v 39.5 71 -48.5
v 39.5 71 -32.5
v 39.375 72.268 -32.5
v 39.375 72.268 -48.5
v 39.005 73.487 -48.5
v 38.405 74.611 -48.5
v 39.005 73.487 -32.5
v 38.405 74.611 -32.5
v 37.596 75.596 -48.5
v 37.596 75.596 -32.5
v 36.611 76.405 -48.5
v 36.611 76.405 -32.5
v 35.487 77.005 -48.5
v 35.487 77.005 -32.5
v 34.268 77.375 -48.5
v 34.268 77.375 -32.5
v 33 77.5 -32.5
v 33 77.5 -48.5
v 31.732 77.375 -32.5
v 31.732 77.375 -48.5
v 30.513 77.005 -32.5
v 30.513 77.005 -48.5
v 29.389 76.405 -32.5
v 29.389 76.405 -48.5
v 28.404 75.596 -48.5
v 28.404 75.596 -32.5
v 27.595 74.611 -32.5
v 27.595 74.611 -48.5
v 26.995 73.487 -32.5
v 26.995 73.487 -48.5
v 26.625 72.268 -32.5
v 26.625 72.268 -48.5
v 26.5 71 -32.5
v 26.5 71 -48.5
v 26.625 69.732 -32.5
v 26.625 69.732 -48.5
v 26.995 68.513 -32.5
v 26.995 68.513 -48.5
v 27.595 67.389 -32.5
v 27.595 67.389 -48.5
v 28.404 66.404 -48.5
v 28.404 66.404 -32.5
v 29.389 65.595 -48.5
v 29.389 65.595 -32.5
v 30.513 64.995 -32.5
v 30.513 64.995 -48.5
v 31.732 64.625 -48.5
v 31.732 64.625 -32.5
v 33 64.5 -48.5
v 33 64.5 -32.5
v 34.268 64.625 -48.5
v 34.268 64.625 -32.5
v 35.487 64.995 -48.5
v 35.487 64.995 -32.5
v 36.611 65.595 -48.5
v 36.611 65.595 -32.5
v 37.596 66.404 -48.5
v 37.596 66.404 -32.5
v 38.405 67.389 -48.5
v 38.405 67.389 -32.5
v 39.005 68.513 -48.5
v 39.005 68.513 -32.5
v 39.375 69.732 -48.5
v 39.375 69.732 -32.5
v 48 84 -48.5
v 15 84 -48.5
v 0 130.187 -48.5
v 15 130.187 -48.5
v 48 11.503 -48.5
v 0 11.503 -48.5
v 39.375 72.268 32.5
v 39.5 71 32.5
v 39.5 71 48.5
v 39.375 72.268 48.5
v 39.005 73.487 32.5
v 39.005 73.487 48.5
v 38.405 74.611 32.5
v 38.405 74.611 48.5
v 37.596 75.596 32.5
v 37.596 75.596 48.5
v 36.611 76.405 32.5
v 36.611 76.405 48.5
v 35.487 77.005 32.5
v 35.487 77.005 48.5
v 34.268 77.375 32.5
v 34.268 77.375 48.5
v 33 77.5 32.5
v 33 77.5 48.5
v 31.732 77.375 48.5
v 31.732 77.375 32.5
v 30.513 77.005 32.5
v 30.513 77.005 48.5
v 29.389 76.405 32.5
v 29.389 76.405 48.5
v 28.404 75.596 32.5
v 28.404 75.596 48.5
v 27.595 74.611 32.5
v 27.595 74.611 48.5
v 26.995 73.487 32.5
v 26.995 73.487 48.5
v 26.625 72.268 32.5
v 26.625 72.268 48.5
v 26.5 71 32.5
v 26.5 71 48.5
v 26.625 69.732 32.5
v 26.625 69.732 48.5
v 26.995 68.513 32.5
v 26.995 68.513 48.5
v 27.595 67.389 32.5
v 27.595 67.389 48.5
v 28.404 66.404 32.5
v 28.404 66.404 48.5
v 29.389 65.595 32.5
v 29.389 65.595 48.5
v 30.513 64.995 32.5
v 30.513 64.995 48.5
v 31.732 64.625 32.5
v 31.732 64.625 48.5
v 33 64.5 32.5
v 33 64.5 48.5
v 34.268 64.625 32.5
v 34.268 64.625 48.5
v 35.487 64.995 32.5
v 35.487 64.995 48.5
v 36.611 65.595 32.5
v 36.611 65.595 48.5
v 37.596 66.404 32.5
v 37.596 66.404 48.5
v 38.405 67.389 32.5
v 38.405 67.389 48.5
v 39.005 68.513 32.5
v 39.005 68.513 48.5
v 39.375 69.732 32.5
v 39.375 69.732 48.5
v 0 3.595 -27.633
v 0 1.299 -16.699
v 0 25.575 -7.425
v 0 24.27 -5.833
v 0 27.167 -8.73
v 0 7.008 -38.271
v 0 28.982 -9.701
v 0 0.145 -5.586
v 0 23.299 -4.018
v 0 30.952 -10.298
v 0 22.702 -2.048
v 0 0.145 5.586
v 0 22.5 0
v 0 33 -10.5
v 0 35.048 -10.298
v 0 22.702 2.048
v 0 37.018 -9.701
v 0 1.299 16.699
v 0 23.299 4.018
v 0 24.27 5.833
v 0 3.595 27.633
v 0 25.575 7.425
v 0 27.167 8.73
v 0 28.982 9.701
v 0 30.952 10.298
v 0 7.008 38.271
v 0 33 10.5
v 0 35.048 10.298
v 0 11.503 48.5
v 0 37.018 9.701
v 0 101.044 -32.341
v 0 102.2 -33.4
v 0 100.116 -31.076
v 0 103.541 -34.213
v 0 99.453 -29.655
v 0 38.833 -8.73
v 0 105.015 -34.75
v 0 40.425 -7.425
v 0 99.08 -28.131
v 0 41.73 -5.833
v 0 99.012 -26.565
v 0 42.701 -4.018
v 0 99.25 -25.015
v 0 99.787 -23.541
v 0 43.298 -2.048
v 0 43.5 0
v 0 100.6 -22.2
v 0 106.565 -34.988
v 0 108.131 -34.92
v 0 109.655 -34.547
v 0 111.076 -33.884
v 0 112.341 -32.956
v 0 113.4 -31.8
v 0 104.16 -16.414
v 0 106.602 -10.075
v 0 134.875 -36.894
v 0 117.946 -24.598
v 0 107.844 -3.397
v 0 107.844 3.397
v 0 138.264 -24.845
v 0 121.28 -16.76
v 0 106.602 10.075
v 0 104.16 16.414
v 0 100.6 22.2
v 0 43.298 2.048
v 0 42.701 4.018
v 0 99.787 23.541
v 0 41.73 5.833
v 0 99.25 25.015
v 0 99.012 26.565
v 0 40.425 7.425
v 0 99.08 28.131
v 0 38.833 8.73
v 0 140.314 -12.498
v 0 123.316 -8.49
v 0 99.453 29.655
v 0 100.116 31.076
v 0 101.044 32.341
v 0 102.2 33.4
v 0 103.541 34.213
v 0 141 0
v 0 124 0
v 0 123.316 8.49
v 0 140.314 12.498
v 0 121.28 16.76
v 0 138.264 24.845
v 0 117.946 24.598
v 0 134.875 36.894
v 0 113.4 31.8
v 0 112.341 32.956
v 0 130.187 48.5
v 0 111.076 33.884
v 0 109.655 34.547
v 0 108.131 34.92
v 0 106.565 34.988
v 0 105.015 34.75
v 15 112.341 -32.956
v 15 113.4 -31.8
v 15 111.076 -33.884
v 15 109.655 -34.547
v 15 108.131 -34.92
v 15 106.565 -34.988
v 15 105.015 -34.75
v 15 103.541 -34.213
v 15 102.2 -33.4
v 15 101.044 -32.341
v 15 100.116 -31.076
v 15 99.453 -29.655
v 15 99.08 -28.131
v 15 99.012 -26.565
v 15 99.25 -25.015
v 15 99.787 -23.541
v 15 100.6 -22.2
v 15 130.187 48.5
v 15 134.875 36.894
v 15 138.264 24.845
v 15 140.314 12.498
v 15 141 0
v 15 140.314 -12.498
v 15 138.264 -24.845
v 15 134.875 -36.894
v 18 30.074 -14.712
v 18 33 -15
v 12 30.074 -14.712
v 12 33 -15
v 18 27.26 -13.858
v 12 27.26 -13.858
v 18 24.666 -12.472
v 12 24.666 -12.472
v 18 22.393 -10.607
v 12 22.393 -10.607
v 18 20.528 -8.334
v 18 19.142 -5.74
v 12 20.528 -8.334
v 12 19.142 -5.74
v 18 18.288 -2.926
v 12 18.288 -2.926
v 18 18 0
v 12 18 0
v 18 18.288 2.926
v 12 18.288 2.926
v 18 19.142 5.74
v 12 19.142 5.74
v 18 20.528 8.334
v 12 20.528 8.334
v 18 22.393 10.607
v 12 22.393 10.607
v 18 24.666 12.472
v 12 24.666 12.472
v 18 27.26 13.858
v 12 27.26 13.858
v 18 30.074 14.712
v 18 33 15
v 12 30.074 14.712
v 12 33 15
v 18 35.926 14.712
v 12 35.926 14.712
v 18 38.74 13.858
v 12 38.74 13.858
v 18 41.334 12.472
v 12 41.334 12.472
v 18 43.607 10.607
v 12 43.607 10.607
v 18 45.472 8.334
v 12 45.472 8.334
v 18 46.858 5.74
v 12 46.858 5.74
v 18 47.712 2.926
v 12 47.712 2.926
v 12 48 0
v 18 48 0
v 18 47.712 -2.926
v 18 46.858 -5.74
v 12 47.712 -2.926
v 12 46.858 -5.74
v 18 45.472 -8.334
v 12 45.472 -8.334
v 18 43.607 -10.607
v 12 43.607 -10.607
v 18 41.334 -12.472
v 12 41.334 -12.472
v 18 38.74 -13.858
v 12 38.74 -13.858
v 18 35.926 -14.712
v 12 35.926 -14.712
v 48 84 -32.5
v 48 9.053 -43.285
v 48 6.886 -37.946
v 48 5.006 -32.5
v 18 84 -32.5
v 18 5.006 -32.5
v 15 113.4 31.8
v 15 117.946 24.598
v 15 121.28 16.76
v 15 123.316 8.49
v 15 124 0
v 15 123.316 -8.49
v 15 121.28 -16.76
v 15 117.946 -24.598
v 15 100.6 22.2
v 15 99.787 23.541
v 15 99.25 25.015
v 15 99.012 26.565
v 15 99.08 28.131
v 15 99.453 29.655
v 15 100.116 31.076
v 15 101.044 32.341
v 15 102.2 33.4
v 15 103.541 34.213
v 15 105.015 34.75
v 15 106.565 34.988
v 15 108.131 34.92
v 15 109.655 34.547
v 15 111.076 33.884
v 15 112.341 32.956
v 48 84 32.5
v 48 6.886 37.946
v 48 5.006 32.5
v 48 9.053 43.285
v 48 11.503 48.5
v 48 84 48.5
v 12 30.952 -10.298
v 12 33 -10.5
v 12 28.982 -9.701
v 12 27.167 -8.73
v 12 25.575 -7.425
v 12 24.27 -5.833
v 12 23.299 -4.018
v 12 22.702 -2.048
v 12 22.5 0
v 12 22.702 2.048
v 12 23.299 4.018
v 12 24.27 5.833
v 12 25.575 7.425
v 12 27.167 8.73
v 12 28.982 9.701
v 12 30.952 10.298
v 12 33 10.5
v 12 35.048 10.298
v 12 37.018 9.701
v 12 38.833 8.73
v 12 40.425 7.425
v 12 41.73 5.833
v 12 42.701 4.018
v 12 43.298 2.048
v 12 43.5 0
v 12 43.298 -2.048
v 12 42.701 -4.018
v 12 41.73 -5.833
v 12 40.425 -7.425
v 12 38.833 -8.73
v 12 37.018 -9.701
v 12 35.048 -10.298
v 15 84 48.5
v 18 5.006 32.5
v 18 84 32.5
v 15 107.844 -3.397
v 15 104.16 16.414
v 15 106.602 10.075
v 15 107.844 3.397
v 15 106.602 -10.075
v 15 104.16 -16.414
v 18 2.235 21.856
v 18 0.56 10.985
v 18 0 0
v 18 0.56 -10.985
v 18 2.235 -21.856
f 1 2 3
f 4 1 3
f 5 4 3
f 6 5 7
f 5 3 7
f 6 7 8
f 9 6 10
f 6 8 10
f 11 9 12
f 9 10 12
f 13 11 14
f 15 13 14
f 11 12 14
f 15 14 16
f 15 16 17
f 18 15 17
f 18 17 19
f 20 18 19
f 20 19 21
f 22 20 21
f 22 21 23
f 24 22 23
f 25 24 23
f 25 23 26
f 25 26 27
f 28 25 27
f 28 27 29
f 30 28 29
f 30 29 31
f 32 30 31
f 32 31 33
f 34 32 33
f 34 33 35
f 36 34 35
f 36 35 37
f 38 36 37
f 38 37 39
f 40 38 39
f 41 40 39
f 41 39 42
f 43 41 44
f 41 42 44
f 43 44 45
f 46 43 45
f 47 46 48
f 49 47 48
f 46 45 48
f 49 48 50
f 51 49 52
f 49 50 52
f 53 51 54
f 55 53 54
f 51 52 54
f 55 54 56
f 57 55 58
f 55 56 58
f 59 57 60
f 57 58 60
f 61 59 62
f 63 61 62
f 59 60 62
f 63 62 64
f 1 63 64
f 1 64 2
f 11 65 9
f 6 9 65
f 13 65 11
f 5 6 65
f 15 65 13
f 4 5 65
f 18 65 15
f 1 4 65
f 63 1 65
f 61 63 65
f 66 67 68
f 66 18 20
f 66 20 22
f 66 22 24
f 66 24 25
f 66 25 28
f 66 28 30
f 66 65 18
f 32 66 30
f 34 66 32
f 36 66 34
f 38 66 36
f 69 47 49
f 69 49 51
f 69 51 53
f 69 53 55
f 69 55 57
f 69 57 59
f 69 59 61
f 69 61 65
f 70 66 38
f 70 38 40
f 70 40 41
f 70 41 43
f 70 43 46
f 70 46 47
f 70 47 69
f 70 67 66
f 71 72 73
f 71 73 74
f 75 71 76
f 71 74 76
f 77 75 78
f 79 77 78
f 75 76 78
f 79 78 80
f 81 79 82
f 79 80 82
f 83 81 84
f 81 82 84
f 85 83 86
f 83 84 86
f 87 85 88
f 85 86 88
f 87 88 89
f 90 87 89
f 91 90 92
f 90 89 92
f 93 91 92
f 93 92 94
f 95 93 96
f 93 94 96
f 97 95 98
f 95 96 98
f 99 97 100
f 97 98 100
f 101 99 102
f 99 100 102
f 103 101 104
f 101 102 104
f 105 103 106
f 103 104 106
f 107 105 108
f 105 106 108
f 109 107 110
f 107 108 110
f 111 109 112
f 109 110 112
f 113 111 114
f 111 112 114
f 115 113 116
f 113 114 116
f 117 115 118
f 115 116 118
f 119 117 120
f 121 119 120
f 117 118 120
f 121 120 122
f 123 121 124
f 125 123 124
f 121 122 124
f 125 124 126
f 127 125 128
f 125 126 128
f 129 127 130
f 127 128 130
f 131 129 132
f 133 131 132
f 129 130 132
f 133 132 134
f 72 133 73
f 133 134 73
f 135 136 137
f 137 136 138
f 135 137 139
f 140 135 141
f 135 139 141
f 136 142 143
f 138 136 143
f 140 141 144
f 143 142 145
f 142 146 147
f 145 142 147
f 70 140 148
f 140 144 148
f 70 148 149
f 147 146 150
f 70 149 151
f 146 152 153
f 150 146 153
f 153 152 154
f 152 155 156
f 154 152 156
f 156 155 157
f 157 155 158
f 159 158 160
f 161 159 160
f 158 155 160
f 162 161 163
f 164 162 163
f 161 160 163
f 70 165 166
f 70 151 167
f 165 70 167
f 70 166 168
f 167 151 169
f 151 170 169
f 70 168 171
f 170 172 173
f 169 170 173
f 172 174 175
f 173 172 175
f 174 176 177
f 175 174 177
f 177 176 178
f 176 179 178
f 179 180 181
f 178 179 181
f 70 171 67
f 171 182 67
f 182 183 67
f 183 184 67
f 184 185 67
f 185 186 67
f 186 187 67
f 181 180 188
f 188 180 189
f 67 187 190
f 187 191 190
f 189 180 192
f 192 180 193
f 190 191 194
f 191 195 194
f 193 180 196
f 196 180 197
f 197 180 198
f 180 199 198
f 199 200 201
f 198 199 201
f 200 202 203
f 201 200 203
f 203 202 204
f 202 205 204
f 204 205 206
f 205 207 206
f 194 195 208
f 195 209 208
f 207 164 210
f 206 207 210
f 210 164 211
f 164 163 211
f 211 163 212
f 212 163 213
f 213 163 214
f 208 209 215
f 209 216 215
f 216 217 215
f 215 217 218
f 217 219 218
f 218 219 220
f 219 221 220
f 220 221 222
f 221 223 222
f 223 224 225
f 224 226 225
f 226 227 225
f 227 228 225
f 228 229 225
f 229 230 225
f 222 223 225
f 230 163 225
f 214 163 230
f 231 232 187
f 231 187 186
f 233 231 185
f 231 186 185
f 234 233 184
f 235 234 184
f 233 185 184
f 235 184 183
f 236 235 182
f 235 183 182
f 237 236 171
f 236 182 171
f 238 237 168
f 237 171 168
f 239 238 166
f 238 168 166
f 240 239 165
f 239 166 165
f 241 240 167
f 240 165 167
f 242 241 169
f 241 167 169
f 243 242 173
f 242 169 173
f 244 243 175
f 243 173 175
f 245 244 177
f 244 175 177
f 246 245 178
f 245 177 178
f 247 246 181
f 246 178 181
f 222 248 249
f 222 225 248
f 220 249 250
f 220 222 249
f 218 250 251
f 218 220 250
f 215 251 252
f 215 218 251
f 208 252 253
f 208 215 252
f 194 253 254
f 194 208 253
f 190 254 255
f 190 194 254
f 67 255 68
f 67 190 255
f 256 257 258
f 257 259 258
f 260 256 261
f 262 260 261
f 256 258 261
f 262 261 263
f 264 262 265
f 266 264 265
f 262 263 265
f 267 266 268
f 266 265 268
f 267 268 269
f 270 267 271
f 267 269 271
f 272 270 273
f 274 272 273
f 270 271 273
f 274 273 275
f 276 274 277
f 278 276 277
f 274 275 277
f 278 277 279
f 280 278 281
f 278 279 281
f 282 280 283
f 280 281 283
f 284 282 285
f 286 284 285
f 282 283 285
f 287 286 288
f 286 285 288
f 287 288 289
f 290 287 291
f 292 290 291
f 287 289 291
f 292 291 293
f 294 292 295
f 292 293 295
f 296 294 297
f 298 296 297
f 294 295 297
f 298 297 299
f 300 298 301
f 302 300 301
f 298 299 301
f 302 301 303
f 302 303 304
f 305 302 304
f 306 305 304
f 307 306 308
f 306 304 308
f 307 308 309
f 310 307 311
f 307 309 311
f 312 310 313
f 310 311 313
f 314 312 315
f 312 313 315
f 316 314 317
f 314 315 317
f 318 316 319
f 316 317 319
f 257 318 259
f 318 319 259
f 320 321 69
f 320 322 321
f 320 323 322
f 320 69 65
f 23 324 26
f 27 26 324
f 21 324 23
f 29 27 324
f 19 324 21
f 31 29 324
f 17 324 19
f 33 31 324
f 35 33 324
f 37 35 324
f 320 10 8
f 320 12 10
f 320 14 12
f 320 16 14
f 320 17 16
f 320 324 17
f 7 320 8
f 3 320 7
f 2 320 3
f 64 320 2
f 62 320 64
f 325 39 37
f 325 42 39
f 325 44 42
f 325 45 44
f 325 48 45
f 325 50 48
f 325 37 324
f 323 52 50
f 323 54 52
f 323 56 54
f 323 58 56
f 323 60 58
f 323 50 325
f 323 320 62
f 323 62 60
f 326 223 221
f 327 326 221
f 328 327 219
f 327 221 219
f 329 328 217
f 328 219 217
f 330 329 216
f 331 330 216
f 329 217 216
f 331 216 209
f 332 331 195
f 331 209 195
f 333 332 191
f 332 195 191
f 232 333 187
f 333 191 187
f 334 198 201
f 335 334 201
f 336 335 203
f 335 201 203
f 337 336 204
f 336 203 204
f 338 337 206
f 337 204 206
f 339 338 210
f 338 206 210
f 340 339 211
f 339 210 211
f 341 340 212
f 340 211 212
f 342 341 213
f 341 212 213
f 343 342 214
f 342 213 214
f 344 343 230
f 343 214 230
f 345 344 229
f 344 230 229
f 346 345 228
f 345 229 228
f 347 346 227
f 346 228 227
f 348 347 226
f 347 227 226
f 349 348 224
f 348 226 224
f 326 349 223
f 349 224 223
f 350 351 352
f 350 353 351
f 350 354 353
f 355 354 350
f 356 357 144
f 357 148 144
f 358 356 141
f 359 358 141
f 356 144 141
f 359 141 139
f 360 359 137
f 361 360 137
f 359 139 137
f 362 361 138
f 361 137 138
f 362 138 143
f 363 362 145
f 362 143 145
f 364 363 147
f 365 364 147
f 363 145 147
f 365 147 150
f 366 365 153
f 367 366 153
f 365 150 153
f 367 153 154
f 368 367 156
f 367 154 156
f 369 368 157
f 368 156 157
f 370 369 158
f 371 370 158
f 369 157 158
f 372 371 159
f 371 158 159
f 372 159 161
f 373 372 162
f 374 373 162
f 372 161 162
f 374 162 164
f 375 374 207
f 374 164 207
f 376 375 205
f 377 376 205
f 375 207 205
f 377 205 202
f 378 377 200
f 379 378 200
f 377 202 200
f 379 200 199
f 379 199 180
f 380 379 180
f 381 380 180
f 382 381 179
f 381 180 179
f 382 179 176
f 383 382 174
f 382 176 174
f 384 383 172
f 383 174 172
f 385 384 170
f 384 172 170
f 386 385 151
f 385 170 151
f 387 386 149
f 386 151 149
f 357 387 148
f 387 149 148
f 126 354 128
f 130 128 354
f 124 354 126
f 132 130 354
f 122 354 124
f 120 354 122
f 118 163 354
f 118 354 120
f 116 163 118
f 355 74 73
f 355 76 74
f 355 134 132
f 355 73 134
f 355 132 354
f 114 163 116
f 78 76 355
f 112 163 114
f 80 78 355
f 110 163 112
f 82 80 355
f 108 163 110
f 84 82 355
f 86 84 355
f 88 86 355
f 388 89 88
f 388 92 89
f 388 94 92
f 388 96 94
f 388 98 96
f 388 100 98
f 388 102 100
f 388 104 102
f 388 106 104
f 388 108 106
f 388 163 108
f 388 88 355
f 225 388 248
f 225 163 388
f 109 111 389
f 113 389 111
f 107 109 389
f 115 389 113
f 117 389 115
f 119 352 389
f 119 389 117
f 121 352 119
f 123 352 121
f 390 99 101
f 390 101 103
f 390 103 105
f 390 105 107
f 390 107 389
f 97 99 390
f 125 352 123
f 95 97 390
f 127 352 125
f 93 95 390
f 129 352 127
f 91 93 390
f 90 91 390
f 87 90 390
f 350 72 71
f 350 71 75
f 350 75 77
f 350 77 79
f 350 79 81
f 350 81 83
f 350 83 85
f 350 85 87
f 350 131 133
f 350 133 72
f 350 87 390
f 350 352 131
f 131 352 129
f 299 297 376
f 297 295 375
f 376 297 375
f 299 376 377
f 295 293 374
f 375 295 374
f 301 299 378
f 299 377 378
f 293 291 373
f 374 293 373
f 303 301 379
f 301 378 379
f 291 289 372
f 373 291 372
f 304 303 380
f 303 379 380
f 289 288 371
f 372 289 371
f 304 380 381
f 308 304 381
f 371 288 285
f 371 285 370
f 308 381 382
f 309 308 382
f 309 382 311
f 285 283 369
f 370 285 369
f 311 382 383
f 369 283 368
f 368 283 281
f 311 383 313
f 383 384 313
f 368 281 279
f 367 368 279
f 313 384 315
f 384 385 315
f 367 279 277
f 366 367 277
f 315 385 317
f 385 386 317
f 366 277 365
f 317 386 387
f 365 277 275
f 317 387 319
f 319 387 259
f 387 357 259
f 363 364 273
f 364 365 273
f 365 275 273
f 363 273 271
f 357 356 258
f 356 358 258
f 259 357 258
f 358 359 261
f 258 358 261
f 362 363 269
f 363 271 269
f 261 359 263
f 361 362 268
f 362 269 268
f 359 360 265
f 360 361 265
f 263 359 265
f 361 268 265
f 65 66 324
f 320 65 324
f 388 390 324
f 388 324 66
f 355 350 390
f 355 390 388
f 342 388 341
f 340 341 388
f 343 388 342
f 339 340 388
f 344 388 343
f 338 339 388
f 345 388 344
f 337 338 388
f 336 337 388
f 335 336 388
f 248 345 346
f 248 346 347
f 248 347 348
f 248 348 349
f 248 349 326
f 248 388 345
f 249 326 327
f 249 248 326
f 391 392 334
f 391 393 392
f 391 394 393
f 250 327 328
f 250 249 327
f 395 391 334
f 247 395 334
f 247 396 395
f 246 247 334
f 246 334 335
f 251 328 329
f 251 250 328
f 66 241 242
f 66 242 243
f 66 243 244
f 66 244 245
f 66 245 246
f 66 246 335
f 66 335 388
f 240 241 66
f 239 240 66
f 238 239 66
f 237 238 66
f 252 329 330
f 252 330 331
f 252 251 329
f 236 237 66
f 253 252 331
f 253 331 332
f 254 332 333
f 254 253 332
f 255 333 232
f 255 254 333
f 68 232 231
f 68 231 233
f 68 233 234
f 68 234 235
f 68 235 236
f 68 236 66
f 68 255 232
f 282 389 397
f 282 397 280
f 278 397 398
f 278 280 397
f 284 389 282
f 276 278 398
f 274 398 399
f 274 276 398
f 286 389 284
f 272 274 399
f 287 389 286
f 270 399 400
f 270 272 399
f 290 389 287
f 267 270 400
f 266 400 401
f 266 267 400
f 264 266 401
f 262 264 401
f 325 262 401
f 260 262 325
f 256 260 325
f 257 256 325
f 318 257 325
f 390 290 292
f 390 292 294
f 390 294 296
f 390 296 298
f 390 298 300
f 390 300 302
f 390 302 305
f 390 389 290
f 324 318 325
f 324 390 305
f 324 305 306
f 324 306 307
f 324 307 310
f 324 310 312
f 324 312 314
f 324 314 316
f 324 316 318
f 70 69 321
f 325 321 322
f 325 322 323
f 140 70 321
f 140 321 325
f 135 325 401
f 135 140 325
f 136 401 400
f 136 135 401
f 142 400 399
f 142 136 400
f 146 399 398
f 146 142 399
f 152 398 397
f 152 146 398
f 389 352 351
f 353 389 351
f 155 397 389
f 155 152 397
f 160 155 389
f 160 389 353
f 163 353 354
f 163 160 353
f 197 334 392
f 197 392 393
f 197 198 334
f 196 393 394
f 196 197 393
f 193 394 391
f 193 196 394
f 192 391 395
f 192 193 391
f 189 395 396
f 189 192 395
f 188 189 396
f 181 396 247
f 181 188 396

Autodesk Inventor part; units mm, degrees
ref_plane "YZ Plane" through (0, 0, 0) normal (1, 0, 0) x (0, 1, 0)
ref_plane "XZ Plane" through (0, 0, 0) normal (0, 1, 0) x (-1, 0, 0)
ref_plane "XY Plane" through (0, 0, 0) normal (0, 0, 1) x (1, 0, 0)
sketch "Sketch1" plane through (0, 0, 0) normal (1, 0, 0) x (0, 1, 0)
  arc A0 (11.5026, 48.5) -> (11.5026, -48.5) centre (108, 0) ccw
  arc A1 (130.1868, -48.5) -> (130.1868, 48.5) centre (26.826, 0) ccw
  line L0 (11.5026, 48.5) -> (130.1868, 48.5)
  line L1 (130.1868, -48.5) -> (11.5026, -48.5)
  line L2 (0, 0) -> (141, 0)
  arc A2 (107, -27) -> (107, 27) centre (71, 0) ccw construction
  arc A3 (113.4, -31.8) -> (113.4, 31.8) centre (71, 0) ccw
  arc A4 (100.6, -22.2) -> (100.6, 22.2) centre (71, 0) ccw
  arc A5 (100.6, -22.2) -> (113.4, -31.8) centre (107, -27) ccw
  arc A6 (113.4, 31.8) -> (100.6, 22.2) centre (107, 27) ccw
  dimension "d0" = 108
  dimension "d2" = 141
  dimension "d3" = 97
  dimension "d4" = 54
  dimension "d5" = 8
  dimension "d6" = 45
extrude "Extrusion1" add sketch "Sketch1" along normal blind 48 contours L0 A1 L2 A3 A6 A4 A0 | L2 A4 A5 A3 A1 L1 A0
sketch "Sketch2" plane through (48, 0, 0) normal (1, 0, 0) x (0, 0, -1)
  line L0 (-88.6528, 151.7053) -> (89.775, 151.7053)
  line L1 (89.775, 151.7053) -> (89.775, 84)
  line L2 (89.775, 84) -> (-88.6528, 84)
  line L3 (-88.6528, 84) -> (-88.6528, 151.7053)
  point P0 (0, 0)
  dimension "d9" = 84
extrude "Extrusion2" cut sketch "Sketch2" against normal blind 33
sketch "Sketch3" plane through (48, 0, 0) normal (1, 0, 0) x (0, 0, -1)
  line L0 (48.5, 84) -> (-48.5, 84) projected
  line L1 (-32.5, 84) -> (32.5, 84)
  line L2 (32.5, 84) -> (32.5, -13.4662)
  line L3 (32.5, -13.4662) -> (-32.5, -13.4662)
  line L4 (-32.5, -13.4662) -> (-32.5, 84)
  line L5 (-48.5, 84) -> (-48.5, 11.5026) projected
  line L6 (48.5, 11.5026) -> (48.5, 84) projected
  point P0 (0, 0)
  dimension "d12" = 16
  dimension "d13" = 16
extrude "Extrusion3" cut sketch "Sketch3" against normal blind 30
sketch "Sketch4" plane through (0, 11.5026, 48.5) normal (0, 0, 1) x (1, 0, 0)
  circle A0 centre (33, 59.4974) radius 6.5
  line L0 (48, 72.4974) -> (15, 72.4974) projected
  line L1 (48, 72.4974) -> (48, 0) projected
  point P0 (0, -11.5026)
  dimension "d16" = 13
  dimension "d17" = 13
  dimension "d18" = 15
extrude "Extrusion4" cut sketch "Sketch4" against normal through all
sketch "Sketch5" plane through (18, 0, 0) normal (1, 0, 0) x (0, 0, -1)
  point P0 (0, 0)
  point P1 (0, 33)
  dimension "d21" = 33
hole "Hole1" at (18, 33, 0) direction (-1, 0, 0) diameter 21 end through all counterbore diameter 30 counterbore depth 6
properties part number "swivel plate"
